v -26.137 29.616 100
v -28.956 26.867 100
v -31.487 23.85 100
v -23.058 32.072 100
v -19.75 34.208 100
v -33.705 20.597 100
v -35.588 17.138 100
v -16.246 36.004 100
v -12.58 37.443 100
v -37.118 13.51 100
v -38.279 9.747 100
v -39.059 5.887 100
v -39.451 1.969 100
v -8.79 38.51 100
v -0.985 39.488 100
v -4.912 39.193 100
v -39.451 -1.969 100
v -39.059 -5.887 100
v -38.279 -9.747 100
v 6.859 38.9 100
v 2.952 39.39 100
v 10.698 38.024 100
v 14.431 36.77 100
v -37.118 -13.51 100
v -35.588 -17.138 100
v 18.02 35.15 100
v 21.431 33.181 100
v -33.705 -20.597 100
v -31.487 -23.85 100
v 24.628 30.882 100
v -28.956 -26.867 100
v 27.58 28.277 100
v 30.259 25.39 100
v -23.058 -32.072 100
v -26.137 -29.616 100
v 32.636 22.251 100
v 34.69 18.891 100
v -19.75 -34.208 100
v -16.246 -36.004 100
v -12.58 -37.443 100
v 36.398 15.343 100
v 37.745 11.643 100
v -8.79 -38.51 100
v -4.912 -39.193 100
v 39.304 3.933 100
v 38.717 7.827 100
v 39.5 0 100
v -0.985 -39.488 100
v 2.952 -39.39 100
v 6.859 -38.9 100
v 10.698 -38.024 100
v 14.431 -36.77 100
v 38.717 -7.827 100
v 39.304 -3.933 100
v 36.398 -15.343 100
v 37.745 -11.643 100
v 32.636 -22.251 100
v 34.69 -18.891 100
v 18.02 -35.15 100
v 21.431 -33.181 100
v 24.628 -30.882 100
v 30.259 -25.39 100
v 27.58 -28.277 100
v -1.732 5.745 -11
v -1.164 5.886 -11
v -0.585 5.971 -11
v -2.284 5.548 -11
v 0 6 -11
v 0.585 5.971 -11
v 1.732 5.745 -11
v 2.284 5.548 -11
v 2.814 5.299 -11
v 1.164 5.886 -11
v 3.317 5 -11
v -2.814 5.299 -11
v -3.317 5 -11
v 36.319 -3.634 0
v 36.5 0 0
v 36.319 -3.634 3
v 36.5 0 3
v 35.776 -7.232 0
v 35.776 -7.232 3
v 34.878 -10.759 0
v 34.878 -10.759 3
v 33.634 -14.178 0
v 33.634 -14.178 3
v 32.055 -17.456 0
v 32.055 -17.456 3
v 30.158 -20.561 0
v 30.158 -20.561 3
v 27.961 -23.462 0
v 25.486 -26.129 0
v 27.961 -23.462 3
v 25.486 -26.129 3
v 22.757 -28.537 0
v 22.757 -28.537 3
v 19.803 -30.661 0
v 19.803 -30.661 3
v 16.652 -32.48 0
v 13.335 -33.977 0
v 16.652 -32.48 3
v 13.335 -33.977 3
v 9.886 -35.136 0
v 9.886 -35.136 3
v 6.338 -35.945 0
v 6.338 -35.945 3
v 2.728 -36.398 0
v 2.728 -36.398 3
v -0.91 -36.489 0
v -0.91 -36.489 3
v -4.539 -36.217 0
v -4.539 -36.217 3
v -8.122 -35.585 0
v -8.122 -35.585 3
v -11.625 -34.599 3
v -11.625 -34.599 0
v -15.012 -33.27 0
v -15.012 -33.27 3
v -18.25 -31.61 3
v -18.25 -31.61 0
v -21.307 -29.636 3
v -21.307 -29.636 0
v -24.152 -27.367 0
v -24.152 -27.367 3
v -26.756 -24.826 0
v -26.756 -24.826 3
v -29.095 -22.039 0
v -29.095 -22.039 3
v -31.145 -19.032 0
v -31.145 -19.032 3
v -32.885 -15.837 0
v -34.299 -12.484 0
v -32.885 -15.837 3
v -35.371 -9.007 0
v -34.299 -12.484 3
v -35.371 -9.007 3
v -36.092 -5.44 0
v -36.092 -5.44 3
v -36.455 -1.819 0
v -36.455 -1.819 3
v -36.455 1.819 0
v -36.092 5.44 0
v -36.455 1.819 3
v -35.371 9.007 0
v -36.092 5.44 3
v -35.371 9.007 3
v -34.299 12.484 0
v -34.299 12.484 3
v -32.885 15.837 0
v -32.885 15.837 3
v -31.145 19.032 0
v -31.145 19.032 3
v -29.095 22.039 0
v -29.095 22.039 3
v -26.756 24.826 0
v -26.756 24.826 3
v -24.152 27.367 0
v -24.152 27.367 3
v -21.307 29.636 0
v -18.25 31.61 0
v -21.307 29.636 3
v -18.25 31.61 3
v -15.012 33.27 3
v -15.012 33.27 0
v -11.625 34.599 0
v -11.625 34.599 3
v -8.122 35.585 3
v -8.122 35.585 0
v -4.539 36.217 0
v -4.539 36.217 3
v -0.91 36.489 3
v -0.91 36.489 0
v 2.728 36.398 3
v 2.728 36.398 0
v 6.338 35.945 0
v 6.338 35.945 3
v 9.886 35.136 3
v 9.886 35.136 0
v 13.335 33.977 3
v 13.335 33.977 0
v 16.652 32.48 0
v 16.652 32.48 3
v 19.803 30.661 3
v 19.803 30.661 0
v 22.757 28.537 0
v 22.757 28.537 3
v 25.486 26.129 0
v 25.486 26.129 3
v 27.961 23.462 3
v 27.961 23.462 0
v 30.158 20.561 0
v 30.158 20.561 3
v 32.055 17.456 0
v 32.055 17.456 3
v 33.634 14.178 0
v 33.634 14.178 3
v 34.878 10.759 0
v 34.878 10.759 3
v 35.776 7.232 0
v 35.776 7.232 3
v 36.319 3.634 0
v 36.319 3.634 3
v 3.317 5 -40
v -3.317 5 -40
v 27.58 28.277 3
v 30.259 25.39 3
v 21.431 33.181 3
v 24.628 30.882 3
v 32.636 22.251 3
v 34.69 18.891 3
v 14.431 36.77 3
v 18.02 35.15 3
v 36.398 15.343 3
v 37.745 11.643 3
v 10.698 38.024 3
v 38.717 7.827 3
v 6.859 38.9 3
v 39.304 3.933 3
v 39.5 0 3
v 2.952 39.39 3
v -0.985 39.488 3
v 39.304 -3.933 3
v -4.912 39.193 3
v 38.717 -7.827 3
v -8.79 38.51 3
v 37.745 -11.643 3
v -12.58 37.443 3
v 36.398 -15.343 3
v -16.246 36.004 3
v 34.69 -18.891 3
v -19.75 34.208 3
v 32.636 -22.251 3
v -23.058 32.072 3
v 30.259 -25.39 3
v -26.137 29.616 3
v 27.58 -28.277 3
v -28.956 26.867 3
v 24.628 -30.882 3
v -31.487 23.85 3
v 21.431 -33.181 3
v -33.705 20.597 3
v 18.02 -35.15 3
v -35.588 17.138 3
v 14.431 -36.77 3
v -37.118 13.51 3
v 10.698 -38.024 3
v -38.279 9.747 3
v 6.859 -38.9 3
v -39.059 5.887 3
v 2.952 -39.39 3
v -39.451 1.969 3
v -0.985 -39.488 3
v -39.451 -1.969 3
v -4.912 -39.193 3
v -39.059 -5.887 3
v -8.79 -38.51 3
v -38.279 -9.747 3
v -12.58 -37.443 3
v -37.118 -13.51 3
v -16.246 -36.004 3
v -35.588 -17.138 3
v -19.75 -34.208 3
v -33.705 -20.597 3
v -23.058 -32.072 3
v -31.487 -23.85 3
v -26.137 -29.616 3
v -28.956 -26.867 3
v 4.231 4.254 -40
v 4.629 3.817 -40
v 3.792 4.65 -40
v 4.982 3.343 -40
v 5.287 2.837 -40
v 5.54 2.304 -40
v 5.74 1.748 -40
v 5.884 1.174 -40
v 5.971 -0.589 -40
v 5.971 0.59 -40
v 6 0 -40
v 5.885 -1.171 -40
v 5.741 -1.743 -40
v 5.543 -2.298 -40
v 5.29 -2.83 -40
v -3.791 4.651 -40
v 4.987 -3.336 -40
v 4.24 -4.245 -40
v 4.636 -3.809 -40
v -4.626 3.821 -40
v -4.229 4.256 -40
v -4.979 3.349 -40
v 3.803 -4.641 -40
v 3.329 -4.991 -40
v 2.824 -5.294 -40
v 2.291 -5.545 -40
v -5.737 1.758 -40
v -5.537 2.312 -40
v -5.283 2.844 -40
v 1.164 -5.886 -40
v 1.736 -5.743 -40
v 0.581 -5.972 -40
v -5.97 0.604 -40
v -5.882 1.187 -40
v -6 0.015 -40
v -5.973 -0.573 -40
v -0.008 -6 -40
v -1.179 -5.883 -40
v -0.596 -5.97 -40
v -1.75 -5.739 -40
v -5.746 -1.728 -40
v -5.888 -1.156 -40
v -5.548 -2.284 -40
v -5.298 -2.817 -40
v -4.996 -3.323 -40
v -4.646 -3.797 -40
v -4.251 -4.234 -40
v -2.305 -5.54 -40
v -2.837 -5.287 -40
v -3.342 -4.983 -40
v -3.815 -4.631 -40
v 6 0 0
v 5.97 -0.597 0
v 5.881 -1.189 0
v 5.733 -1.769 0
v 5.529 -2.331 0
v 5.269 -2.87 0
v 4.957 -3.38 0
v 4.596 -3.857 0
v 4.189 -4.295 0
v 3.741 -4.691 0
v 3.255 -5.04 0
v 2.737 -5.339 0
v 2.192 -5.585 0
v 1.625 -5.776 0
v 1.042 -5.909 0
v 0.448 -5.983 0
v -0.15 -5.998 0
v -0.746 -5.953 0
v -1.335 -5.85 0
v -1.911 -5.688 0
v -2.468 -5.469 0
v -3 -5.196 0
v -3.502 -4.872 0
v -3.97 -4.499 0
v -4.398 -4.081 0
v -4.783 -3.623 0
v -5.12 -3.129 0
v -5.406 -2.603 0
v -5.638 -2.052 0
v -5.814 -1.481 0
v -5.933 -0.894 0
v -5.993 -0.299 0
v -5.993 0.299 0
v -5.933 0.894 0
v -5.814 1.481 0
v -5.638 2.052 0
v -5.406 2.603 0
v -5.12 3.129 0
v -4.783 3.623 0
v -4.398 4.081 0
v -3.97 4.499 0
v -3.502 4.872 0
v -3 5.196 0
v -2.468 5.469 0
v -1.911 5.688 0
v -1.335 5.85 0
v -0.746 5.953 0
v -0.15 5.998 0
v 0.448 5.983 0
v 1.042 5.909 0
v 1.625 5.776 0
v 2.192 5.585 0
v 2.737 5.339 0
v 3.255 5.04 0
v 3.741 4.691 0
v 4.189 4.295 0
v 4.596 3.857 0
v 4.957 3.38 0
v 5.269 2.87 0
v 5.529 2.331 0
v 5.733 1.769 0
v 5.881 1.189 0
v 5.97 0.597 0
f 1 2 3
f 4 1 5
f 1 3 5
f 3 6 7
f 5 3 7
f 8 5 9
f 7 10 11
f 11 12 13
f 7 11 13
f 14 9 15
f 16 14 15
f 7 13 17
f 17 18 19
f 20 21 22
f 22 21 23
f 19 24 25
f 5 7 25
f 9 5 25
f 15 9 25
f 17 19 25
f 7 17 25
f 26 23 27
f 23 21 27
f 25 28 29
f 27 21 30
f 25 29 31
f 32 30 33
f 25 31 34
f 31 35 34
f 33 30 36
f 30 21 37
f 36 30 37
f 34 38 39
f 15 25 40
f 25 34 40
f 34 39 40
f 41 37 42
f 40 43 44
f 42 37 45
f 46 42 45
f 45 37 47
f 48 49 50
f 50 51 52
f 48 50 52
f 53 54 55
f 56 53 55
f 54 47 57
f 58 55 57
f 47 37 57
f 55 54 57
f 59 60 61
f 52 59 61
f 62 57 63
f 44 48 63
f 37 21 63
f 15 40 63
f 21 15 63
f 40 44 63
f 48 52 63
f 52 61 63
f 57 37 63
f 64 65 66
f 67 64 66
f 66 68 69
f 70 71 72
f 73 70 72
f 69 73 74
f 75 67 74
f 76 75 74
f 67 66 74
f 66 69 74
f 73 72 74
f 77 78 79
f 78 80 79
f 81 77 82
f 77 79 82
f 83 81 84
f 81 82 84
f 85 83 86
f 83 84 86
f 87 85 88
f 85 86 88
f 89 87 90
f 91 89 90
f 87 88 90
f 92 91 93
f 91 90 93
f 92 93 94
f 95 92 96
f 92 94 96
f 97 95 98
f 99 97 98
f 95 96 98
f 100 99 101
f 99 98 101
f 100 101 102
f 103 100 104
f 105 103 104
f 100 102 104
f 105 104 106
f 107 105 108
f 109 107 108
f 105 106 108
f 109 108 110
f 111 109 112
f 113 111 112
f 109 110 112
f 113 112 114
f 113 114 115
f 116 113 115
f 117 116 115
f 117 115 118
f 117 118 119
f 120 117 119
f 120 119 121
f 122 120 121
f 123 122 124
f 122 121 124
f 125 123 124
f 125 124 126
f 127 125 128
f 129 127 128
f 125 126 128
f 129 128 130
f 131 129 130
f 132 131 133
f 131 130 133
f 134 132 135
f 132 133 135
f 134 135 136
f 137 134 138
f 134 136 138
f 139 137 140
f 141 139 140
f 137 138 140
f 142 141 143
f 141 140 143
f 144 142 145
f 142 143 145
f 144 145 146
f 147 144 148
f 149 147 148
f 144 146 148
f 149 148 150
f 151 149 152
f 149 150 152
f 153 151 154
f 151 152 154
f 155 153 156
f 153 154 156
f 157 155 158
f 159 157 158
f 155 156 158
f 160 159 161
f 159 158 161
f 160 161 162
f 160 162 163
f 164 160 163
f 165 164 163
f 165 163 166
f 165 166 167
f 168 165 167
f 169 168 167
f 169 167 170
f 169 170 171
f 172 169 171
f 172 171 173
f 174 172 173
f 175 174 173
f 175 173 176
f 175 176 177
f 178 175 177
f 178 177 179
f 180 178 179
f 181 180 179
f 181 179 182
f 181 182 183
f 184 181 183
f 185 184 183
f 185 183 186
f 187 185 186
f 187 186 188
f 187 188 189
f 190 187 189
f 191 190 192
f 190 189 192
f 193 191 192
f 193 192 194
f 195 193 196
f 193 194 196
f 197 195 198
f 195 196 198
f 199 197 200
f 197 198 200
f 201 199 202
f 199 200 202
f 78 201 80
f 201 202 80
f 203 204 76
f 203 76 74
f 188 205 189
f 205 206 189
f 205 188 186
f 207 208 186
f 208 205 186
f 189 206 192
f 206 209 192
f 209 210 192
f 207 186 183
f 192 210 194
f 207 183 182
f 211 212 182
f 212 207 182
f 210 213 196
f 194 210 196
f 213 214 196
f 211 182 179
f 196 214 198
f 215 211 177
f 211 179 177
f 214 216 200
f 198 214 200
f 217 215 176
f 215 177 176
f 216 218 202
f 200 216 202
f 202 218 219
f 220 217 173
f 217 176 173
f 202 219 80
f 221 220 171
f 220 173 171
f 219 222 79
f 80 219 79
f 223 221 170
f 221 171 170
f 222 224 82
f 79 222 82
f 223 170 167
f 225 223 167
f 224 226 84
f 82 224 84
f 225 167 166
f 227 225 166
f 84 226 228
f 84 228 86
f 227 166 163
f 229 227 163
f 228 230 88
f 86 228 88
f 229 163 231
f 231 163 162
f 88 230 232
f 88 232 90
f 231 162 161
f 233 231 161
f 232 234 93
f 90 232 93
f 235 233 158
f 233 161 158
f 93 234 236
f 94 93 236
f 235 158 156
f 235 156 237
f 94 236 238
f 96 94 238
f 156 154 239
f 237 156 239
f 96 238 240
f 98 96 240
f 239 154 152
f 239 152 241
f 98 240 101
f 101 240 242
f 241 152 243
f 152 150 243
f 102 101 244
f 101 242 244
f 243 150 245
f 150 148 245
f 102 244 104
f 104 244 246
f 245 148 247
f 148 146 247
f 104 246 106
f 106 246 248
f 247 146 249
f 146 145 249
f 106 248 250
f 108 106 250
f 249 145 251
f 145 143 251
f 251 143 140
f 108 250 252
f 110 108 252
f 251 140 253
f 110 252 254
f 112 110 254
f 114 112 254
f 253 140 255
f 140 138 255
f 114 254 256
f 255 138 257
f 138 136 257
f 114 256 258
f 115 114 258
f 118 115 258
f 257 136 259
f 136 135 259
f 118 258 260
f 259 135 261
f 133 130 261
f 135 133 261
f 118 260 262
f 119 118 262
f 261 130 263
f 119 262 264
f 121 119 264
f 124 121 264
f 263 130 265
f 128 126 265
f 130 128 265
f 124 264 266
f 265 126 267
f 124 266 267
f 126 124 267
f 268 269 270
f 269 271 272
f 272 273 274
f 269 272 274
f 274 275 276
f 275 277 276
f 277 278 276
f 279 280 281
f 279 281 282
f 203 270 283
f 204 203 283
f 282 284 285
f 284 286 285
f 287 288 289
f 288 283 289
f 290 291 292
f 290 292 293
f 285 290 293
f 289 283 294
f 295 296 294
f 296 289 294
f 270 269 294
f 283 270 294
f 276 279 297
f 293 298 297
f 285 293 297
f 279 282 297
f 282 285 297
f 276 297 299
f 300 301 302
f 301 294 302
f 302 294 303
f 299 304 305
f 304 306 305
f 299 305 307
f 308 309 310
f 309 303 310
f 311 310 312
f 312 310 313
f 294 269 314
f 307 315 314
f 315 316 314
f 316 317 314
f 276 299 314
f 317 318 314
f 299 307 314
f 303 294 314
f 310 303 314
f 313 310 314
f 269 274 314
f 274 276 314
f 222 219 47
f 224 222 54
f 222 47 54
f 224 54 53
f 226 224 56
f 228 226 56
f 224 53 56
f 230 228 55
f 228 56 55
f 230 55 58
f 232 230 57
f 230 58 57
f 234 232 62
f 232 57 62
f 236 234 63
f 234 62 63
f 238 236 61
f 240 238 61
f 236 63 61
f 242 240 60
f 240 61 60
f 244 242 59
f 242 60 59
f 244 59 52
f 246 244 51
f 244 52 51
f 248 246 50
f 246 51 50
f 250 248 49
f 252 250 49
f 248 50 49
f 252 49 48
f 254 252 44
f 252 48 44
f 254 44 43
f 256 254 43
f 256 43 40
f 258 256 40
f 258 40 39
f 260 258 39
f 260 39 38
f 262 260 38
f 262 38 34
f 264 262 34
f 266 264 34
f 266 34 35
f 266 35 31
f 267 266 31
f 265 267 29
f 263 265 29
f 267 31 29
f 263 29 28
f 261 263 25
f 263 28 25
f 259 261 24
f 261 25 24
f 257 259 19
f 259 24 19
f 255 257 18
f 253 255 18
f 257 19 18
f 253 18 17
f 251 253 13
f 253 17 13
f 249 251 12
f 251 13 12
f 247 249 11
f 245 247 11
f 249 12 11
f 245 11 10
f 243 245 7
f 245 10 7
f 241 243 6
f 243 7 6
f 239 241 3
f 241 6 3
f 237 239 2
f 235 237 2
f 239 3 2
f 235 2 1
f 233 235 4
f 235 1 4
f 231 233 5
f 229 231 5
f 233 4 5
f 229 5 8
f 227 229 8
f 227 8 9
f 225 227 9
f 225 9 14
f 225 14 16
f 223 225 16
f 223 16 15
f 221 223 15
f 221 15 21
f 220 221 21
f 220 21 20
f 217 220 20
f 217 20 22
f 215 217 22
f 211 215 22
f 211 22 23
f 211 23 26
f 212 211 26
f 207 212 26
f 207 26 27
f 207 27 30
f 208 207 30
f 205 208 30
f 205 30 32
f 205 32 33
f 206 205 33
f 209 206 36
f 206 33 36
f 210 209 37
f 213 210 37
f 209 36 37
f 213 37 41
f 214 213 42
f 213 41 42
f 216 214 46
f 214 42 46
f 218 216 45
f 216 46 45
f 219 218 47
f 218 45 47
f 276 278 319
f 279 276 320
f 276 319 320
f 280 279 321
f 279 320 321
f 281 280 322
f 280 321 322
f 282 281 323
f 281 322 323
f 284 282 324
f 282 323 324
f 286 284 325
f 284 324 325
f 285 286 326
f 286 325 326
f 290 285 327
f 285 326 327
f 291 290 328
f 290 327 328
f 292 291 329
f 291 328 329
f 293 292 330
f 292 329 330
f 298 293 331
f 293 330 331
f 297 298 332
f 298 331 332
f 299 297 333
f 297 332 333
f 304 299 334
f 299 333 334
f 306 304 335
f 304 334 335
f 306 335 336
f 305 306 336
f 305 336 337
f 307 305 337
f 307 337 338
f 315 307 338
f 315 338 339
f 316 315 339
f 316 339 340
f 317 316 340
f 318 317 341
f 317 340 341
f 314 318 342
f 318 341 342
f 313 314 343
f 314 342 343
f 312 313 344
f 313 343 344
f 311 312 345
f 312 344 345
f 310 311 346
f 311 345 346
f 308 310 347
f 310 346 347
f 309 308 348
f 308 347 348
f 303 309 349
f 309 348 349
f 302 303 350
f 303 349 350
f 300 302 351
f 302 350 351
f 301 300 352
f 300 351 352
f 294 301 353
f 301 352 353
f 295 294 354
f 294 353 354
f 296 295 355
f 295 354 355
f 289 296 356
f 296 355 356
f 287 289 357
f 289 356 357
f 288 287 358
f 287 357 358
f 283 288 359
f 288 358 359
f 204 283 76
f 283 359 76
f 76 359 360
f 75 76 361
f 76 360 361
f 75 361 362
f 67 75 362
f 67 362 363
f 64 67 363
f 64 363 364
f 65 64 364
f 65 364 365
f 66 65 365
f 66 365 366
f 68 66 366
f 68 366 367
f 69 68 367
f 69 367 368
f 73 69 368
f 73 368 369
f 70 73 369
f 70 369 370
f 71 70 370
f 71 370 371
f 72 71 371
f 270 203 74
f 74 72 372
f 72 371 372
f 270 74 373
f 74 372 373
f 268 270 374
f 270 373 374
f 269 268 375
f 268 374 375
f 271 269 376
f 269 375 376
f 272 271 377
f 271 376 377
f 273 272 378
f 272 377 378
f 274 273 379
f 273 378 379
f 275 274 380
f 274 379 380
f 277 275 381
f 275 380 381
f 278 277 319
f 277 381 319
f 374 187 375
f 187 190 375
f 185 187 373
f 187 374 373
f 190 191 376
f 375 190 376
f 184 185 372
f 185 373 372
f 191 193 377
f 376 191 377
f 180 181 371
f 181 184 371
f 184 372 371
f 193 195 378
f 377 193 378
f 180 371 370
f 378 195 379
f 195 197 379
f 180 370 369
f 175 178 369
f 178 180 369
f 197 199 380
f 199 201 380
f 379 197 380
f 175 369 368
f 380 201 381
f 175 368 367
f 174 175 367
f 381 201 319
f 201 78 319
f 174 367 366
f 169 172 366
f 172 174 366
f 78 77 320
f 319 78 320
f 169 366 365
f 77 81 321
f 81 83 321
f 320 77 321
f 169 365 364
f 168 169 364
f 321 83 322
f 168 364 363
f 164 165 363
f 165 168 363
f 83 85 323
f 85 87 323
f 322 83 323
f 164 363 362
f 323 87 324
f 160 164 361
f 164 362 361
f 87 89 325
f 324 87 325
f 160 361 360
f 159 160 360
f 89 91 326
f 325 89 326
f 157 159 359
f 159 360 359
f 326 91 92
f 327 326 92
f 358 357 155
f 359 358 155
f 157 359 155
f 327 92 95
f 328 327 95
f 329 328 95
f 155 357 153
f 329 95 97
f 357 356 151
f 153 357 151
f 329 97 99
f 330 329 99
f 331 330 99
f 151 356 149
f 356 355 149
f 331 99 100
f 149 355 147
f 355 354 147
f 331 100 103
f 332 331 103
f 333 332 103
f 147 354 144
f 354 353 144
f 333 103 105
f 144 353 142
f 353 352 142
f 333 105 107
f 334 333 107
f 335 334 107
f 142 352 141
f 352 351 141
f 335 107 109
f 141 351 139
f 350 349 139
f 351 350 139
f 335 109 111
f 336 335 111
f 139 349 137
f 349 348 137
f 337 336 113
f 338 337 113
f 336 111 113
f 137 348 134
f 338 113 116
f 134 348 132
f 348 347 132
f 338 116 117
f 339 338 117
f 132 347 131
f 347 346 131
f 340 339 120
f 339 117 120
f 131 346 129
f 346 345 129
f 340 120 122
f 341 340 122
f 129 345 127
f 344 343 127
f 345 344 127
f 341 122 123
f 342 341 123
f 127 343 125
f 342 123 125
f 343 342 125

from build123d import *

# Parameters (mm, degrees)
CUT_EXTRUDE_START   = -11
SKETCH_2_W          = 16
SKETCH_2_H          = 5
CUT_EXTRUDE_4_DEPTH = 29


with BuildPart() as part:
    # 草图1 → 旋转1 (revolve)
    with BuildSketch(Plane(origin=(0, 0, 0), x_dir=(0, 0, -1), z_dir=(1, 0, 0)), mode=Mode.PRIVATE) as revolve_1_sk:
        Polygon((40, 0), (40, 6), (0, 6), (0, 36.5), (-3, 36.5), (-3, 39.5), (-100, 39.5), (-100, 0), align=None)
    revolve(revolve_1_sk.sketch.rotate(Axis((0, 0, 105), (0, 0, -1)), 90), axis=Axis((0, 0, 105), (0, 0, -1)))

    # 草图2 → 切除-拉伸4 (cut)
    with BuildSketch(Plane.XY.offset(CUT_EXTRUDE_START)):
        with Locations((0, 7.5)):
            Rectangle(SKETCH_2_W, SKETCH_2_H)
    extrude(amount=-CUT_EXTRUDE_4_DEPTH, mode=Mode.SUBTRACT)


solid = part.part
